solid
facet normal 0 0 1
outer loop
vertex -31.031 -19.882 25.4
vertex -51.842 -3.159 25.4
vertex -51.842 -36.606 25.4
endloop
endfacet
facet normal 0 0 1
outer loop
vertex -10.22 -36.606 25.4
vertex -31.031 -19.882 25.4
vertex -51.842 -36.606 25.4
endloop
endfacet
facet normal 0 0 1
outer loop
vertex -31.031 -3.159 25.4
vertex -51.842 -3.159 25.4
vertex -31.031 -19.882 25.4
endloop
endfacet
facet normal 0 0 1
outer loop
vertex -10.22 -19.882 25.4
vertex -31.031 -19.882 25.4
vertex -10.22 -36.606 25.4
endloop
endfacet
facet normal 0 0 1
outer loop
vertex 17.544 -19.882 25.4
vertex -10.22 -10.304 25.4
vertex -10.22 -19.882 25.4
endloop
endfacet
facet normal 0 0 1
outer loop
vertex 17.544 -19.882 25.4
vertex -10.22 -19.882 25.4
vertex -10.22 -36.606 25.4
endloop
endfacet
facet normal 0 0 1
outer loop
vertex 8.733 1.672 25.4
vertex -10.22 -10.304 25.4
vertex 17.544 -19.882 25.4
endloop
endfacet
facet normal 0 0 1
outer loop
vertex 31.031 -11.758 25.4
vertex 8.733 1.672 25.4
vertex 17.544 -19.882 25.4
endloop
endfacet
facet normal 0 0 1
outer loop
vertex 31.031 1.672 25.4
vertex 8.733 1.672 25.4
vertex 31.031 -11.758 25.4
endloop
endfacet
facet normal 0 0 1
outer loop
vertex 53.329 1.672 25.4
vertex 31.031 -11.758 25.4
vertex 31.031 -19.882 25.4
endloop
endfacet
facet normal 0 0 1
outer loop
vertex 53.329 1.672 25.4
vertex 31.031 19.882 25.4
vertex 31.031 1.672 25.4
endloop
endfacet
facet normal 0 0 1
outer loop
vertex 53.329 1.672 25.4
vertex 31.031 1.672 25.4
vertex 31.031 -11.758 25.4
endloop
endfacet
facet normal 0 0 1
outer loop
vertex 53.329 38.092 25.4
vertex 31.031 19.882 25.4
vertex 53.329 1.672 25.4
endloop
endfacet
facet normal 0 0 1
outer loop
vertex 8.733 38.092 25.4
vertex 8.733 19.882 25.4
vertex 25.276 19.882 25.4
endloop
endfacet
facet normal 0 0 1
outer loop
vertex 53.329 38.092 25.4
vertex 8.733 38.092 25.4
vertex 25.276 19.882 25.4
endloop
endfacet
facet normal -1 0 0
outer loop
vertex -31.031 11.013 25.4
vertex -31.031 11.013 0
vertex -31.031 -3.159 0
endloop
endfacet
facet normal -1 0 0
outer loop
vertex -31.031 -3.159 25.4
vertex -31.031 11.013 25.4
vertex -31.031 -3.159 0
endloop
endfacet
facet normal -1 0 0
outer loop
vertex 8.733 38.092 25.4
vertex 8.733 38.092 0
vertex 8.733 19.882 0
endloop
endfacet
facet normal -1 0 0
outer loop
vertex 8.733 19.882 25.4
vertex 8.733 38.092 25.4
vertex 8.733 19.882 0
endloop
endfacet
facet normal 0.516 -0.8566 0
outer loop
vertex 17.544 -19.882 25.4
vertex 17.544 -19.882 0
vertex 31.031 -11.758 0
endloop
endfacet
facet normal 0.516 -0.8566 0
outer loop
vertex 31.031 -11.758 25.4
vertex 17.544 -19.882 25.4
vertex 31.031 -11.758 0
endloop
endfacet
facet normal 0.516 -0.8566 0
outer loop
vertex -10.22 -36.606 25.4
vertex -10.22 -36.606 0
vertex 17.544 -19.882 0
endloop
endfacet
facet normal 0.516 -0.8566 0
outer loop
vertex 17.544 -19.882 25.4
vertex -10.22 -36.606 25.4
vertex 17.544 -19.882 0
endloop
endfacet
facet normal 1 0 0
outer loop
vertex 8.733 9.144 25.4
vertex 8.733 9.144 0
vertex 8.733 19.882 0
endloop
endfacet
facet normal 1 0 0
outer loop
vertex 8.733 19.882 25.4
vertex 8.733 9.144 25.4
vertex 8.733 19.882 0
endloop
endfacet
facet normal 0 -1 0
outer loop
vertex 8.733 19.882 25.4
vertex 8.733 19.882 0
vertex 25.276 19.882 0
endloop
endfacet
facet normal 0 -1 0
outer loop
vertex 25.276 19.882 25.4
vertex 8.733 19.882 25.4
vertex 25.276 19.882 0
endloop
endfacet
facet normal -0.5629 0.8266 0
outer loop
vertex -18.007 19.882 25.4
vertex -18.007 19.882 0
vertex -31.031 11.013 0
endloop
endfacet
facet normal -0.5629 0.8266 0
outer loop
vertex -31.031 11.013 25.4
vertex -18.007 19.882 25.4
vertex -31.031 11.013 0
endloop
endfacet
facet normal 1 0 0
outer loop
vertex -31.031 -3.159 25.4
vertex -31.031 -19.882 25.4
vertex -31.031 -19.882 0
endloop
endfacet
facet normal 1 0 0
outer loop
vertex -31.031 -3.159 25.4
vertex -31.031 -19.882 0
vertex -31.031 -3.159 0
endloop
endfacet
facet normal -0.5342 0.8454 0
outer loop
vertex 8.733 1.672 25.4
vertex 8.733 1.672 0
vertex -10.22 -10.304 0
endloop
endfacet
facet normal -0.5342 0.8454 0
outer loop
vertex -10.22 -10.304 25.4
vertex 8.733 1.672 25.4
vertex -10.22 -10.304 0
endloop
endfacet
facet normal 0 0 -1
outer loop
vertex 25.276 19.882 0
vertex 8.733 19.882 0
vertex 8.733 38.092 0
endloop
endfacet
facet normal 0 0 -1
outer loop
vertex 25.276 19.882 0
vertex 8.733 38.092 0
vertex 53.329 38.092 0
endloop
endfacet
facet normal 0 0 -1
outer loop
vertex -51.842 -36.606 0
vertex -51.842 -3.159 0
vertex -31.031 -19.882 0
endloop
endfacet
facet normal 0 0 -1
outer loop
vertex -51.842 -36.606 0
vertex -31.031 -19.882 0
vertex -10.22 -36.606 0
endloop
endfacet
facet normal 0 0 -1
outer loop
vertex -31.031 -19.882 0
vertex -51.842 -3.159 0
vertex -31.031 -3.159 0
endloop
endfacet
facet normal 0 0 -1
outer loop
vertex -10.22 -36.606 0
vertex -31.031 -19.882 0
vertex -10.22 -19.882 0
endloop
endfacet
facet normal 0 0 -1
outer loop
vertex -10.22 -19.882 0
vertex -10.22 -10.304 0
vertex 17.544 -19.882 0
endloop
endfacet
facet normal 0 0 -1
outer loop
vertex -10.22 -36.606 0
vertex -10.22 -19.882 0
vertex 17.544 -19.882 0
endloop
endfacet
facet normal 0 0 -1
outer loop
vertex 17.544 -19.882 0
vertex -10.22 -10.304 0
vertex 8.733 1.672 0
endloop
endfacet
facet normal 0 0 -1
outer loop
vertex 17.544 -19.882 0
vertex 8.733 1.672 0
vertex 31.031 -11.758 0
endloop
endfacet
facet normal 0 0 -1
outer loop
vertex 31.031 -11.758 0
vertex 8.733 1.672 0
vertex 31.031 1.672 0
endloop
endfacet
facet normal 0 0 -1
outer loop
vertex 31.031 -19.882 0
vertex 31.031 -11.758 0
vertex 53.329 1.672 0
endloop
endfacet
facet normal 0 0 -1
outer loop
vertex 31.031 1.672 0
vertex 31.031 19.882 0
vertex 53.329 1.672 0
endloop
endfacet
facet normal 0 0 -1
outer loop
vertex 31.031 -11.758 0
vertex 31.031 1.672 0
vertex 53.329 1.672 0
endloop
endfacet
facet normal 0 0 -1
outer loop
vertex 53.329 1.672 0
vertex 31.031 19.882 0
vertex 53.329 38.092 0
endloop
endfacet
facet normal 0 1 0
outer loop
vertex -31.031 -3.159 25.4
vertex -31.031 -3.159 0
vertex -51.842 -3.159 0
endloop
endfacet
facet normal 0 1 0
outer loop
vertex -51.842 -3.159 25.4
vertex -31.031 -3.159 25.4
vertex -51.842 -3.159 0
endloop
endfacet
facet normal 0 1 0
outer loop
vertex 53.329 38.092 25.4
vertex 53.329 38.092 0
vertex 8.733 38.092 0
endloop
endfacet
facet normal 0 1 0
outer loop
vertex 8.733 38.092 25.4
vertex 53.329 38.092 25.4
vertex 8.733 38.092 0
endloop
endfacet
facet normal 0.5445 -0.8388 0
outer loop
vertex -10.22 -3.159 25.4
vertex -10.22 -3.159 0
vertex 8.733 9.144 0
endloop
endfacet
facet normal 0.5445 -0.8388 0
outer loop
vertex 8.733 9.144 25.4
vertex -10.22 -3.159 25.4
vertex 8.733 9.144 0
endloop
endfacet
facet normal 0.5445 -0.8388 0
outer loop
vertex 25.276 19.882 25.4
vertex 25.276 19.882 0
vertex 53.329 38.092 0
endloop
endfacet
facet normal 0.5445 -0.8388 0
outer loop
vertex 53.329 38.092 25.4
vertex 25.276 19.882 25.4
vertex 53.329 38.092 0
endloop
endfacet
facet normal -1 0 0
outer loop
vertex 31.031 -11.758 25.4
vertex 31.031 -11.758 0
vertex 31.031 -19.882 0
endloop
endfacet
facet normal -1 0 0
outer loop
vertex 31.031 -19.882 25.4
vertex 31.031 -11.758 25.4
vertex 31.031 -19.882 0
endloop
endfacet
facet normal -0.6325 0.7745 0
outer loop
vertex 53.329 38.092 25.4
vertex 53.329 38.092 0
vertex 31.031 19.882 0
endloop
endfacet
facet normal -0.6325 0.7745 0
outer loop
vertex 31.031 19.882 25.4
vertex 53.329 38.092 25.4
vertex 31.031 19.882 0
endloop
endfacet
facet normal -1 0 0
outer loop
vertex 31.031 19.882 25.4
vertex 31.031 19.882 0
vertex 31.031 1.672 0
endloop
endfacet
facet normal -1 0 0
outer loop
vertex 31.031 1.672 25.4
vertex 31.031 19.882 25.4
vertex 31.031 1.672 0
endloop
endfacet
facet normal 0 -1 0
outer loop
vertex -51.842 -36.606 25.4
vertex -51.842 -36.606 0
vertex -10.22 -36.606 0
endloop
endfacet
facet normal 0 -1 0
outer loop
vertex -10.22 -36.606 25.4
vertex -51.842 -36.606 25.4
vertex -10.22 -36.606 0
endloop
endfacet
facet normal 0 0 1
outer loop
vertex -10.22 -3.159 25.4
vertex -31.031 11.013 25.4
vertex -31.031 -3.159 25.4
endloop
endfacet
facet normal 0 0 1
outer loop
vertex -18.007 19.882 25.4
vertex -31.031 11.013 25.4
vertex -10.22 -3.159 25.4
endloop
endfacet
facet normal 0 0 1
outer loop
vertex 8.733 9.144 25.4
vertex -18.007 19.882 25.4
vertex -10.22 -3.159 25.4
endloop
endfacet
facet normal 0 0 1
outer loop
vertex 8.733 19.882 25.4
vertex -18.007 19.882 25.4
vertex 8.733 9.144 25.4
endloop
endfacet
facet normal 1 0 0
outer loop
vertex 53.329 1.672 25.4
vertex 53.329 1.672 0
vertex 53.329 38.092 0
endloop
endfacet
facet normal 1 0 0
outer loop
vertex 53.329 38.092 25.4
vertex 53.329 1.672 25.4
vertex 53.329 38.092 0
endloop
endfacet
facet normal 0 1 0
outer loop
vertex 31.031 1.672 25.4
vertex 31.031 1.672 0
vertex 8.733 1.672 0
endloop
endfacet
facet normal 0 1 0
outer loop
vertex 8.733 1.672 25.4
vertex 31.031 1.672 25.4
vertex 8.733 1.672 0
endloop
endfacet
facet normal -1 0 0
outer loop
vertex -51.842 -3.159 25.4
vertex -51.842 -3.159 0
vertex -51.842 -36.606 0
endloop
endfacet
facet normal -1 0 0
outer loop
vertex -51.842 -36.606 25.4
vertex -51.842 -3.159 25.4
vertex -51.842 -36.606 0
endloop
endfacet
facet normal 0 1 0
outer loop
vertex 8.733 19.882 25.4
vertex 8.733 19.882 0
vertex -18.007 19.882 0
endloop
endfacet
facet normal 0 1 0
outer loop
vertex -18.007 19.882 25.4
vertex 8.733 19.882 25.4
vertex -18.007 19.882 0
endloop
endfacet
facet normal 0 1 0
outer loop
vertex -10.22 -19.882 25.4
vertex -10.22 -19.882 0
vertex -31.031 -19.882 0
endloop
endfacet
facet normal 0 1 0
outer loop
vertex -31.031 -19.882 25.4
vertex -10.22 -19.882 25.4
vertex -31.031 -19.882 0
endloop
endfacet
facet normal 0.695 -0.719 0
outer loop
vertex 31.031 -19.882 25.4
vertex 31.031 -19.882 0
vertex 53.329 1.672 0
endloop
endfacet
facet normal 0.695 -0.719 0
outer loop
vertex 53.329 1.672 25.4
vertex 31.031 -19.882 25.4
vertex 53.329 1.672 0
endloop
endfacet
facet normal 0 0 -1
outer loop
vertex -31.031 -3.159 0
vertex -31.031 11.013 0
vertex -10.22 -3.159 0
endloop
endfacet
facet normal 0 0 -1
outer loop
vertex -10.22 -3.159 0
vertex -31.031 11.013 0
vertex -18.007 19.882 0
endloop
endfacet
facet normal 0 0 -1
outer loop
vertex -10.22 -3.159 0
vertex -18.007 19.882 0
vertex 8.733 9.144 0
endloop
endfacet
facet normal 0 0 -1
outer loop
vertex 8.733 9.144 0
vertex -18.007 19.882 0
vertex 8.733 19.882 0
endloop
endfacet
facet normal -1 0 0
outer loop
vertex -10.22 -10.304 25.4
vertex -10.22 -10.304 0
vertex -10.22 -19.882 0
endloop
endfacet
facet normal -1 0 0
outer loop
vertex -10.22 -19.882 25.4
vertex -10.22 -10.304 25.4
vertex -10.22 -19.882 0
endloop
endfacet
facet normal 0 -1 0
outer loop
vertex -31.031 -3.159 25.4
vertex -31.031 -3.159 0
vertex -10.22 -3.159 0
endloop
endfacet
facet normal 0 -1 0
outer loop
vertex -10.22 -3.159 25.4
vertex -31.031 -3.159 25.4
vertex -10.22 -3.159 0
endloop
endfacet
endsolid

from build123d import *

# Parameters (mm, degrees)
F1_DEPTH = 25.4


with BuildPart() as f1:
    # F0 (on Top) → F1 (new body)
    with BuildSketch(Plane.XY):
        Polygon((8.7332976982, 19.8821946979), (-18.0073068038, 19.8821946979), (-31.0310907662, 11.0132374132), (-31.0310907662, -3.1588526908), (-10.2198235691, -3.1588526908), (8.7332976982, 9.144048138), align=None)
    extrude(amount=F1_DEPTH)


with BuildPart() as f1b:
    # F0 (on Top) → F1, piece 2 (new body)
    with BuildSketch(Plane.XY):
        Polygon((31.0310907662, 1.672334969), (8.7332976982, 1.672334969), (-10.2198235691, -10.304178298), (-10.2198235691, -19.8821946979), (17.5441748335, -19.8821946979), (31.0310907662, -11.7584977976), align=None)
        Polygon((53.3288838342, 1.672334969), (53.3288838342, 38.0920544267), (31.0310907662, 19.8821946979), (31.0310907662, 1.672334969), align=None)
        Polygon((31.0310907662, -11.7584977976), (53.3288838342, 1.672334969), (31.0310907662, 1.672334969), align=None)
        Polygon((31.0310907662, -19.8821946979), (53.3288838342, 1.672334969), (31.0310907662, -11.7584977976), align=None)
        Polygon((-25.3772656626, -19.8821946979), (-51.8423579633, -36.6055367049), (-10.2198235691, -36.6055367049), (-10.2198235691, -19.8821946979), align=None)
        Polygon((-10.2198235691, -19.8821946979), (-10.2198235691, -36.6055367049), (17.5441748335, -19.8821946979), align=None)
        Polygon((-31.0310907662, -19.8821946979), (-31.0310907662, -3.1588526908), (-51.8423579633, -3.1588526908), (-51.8423579633, -36.6055367049), (-25.3772656626, -19.8821946979), align=None)
    extrude(amount=F1_DEPTH)


with BuildPart() as f1c:
    # F0 (on Top) → F1, piece 3 (new body)
    with BuildSketch(Plane.XY):
        Polygon((53.3288838342, 38.0920544267), (8.7332976982, 38.0920544267), (8.7332976982, 19.8821946979), (25.2758510981, 19.8821946979), align=None)
    extrude(amount=F1_DEPTH)


solid = Compound([f1.part, f1b.part, f1c.part])
